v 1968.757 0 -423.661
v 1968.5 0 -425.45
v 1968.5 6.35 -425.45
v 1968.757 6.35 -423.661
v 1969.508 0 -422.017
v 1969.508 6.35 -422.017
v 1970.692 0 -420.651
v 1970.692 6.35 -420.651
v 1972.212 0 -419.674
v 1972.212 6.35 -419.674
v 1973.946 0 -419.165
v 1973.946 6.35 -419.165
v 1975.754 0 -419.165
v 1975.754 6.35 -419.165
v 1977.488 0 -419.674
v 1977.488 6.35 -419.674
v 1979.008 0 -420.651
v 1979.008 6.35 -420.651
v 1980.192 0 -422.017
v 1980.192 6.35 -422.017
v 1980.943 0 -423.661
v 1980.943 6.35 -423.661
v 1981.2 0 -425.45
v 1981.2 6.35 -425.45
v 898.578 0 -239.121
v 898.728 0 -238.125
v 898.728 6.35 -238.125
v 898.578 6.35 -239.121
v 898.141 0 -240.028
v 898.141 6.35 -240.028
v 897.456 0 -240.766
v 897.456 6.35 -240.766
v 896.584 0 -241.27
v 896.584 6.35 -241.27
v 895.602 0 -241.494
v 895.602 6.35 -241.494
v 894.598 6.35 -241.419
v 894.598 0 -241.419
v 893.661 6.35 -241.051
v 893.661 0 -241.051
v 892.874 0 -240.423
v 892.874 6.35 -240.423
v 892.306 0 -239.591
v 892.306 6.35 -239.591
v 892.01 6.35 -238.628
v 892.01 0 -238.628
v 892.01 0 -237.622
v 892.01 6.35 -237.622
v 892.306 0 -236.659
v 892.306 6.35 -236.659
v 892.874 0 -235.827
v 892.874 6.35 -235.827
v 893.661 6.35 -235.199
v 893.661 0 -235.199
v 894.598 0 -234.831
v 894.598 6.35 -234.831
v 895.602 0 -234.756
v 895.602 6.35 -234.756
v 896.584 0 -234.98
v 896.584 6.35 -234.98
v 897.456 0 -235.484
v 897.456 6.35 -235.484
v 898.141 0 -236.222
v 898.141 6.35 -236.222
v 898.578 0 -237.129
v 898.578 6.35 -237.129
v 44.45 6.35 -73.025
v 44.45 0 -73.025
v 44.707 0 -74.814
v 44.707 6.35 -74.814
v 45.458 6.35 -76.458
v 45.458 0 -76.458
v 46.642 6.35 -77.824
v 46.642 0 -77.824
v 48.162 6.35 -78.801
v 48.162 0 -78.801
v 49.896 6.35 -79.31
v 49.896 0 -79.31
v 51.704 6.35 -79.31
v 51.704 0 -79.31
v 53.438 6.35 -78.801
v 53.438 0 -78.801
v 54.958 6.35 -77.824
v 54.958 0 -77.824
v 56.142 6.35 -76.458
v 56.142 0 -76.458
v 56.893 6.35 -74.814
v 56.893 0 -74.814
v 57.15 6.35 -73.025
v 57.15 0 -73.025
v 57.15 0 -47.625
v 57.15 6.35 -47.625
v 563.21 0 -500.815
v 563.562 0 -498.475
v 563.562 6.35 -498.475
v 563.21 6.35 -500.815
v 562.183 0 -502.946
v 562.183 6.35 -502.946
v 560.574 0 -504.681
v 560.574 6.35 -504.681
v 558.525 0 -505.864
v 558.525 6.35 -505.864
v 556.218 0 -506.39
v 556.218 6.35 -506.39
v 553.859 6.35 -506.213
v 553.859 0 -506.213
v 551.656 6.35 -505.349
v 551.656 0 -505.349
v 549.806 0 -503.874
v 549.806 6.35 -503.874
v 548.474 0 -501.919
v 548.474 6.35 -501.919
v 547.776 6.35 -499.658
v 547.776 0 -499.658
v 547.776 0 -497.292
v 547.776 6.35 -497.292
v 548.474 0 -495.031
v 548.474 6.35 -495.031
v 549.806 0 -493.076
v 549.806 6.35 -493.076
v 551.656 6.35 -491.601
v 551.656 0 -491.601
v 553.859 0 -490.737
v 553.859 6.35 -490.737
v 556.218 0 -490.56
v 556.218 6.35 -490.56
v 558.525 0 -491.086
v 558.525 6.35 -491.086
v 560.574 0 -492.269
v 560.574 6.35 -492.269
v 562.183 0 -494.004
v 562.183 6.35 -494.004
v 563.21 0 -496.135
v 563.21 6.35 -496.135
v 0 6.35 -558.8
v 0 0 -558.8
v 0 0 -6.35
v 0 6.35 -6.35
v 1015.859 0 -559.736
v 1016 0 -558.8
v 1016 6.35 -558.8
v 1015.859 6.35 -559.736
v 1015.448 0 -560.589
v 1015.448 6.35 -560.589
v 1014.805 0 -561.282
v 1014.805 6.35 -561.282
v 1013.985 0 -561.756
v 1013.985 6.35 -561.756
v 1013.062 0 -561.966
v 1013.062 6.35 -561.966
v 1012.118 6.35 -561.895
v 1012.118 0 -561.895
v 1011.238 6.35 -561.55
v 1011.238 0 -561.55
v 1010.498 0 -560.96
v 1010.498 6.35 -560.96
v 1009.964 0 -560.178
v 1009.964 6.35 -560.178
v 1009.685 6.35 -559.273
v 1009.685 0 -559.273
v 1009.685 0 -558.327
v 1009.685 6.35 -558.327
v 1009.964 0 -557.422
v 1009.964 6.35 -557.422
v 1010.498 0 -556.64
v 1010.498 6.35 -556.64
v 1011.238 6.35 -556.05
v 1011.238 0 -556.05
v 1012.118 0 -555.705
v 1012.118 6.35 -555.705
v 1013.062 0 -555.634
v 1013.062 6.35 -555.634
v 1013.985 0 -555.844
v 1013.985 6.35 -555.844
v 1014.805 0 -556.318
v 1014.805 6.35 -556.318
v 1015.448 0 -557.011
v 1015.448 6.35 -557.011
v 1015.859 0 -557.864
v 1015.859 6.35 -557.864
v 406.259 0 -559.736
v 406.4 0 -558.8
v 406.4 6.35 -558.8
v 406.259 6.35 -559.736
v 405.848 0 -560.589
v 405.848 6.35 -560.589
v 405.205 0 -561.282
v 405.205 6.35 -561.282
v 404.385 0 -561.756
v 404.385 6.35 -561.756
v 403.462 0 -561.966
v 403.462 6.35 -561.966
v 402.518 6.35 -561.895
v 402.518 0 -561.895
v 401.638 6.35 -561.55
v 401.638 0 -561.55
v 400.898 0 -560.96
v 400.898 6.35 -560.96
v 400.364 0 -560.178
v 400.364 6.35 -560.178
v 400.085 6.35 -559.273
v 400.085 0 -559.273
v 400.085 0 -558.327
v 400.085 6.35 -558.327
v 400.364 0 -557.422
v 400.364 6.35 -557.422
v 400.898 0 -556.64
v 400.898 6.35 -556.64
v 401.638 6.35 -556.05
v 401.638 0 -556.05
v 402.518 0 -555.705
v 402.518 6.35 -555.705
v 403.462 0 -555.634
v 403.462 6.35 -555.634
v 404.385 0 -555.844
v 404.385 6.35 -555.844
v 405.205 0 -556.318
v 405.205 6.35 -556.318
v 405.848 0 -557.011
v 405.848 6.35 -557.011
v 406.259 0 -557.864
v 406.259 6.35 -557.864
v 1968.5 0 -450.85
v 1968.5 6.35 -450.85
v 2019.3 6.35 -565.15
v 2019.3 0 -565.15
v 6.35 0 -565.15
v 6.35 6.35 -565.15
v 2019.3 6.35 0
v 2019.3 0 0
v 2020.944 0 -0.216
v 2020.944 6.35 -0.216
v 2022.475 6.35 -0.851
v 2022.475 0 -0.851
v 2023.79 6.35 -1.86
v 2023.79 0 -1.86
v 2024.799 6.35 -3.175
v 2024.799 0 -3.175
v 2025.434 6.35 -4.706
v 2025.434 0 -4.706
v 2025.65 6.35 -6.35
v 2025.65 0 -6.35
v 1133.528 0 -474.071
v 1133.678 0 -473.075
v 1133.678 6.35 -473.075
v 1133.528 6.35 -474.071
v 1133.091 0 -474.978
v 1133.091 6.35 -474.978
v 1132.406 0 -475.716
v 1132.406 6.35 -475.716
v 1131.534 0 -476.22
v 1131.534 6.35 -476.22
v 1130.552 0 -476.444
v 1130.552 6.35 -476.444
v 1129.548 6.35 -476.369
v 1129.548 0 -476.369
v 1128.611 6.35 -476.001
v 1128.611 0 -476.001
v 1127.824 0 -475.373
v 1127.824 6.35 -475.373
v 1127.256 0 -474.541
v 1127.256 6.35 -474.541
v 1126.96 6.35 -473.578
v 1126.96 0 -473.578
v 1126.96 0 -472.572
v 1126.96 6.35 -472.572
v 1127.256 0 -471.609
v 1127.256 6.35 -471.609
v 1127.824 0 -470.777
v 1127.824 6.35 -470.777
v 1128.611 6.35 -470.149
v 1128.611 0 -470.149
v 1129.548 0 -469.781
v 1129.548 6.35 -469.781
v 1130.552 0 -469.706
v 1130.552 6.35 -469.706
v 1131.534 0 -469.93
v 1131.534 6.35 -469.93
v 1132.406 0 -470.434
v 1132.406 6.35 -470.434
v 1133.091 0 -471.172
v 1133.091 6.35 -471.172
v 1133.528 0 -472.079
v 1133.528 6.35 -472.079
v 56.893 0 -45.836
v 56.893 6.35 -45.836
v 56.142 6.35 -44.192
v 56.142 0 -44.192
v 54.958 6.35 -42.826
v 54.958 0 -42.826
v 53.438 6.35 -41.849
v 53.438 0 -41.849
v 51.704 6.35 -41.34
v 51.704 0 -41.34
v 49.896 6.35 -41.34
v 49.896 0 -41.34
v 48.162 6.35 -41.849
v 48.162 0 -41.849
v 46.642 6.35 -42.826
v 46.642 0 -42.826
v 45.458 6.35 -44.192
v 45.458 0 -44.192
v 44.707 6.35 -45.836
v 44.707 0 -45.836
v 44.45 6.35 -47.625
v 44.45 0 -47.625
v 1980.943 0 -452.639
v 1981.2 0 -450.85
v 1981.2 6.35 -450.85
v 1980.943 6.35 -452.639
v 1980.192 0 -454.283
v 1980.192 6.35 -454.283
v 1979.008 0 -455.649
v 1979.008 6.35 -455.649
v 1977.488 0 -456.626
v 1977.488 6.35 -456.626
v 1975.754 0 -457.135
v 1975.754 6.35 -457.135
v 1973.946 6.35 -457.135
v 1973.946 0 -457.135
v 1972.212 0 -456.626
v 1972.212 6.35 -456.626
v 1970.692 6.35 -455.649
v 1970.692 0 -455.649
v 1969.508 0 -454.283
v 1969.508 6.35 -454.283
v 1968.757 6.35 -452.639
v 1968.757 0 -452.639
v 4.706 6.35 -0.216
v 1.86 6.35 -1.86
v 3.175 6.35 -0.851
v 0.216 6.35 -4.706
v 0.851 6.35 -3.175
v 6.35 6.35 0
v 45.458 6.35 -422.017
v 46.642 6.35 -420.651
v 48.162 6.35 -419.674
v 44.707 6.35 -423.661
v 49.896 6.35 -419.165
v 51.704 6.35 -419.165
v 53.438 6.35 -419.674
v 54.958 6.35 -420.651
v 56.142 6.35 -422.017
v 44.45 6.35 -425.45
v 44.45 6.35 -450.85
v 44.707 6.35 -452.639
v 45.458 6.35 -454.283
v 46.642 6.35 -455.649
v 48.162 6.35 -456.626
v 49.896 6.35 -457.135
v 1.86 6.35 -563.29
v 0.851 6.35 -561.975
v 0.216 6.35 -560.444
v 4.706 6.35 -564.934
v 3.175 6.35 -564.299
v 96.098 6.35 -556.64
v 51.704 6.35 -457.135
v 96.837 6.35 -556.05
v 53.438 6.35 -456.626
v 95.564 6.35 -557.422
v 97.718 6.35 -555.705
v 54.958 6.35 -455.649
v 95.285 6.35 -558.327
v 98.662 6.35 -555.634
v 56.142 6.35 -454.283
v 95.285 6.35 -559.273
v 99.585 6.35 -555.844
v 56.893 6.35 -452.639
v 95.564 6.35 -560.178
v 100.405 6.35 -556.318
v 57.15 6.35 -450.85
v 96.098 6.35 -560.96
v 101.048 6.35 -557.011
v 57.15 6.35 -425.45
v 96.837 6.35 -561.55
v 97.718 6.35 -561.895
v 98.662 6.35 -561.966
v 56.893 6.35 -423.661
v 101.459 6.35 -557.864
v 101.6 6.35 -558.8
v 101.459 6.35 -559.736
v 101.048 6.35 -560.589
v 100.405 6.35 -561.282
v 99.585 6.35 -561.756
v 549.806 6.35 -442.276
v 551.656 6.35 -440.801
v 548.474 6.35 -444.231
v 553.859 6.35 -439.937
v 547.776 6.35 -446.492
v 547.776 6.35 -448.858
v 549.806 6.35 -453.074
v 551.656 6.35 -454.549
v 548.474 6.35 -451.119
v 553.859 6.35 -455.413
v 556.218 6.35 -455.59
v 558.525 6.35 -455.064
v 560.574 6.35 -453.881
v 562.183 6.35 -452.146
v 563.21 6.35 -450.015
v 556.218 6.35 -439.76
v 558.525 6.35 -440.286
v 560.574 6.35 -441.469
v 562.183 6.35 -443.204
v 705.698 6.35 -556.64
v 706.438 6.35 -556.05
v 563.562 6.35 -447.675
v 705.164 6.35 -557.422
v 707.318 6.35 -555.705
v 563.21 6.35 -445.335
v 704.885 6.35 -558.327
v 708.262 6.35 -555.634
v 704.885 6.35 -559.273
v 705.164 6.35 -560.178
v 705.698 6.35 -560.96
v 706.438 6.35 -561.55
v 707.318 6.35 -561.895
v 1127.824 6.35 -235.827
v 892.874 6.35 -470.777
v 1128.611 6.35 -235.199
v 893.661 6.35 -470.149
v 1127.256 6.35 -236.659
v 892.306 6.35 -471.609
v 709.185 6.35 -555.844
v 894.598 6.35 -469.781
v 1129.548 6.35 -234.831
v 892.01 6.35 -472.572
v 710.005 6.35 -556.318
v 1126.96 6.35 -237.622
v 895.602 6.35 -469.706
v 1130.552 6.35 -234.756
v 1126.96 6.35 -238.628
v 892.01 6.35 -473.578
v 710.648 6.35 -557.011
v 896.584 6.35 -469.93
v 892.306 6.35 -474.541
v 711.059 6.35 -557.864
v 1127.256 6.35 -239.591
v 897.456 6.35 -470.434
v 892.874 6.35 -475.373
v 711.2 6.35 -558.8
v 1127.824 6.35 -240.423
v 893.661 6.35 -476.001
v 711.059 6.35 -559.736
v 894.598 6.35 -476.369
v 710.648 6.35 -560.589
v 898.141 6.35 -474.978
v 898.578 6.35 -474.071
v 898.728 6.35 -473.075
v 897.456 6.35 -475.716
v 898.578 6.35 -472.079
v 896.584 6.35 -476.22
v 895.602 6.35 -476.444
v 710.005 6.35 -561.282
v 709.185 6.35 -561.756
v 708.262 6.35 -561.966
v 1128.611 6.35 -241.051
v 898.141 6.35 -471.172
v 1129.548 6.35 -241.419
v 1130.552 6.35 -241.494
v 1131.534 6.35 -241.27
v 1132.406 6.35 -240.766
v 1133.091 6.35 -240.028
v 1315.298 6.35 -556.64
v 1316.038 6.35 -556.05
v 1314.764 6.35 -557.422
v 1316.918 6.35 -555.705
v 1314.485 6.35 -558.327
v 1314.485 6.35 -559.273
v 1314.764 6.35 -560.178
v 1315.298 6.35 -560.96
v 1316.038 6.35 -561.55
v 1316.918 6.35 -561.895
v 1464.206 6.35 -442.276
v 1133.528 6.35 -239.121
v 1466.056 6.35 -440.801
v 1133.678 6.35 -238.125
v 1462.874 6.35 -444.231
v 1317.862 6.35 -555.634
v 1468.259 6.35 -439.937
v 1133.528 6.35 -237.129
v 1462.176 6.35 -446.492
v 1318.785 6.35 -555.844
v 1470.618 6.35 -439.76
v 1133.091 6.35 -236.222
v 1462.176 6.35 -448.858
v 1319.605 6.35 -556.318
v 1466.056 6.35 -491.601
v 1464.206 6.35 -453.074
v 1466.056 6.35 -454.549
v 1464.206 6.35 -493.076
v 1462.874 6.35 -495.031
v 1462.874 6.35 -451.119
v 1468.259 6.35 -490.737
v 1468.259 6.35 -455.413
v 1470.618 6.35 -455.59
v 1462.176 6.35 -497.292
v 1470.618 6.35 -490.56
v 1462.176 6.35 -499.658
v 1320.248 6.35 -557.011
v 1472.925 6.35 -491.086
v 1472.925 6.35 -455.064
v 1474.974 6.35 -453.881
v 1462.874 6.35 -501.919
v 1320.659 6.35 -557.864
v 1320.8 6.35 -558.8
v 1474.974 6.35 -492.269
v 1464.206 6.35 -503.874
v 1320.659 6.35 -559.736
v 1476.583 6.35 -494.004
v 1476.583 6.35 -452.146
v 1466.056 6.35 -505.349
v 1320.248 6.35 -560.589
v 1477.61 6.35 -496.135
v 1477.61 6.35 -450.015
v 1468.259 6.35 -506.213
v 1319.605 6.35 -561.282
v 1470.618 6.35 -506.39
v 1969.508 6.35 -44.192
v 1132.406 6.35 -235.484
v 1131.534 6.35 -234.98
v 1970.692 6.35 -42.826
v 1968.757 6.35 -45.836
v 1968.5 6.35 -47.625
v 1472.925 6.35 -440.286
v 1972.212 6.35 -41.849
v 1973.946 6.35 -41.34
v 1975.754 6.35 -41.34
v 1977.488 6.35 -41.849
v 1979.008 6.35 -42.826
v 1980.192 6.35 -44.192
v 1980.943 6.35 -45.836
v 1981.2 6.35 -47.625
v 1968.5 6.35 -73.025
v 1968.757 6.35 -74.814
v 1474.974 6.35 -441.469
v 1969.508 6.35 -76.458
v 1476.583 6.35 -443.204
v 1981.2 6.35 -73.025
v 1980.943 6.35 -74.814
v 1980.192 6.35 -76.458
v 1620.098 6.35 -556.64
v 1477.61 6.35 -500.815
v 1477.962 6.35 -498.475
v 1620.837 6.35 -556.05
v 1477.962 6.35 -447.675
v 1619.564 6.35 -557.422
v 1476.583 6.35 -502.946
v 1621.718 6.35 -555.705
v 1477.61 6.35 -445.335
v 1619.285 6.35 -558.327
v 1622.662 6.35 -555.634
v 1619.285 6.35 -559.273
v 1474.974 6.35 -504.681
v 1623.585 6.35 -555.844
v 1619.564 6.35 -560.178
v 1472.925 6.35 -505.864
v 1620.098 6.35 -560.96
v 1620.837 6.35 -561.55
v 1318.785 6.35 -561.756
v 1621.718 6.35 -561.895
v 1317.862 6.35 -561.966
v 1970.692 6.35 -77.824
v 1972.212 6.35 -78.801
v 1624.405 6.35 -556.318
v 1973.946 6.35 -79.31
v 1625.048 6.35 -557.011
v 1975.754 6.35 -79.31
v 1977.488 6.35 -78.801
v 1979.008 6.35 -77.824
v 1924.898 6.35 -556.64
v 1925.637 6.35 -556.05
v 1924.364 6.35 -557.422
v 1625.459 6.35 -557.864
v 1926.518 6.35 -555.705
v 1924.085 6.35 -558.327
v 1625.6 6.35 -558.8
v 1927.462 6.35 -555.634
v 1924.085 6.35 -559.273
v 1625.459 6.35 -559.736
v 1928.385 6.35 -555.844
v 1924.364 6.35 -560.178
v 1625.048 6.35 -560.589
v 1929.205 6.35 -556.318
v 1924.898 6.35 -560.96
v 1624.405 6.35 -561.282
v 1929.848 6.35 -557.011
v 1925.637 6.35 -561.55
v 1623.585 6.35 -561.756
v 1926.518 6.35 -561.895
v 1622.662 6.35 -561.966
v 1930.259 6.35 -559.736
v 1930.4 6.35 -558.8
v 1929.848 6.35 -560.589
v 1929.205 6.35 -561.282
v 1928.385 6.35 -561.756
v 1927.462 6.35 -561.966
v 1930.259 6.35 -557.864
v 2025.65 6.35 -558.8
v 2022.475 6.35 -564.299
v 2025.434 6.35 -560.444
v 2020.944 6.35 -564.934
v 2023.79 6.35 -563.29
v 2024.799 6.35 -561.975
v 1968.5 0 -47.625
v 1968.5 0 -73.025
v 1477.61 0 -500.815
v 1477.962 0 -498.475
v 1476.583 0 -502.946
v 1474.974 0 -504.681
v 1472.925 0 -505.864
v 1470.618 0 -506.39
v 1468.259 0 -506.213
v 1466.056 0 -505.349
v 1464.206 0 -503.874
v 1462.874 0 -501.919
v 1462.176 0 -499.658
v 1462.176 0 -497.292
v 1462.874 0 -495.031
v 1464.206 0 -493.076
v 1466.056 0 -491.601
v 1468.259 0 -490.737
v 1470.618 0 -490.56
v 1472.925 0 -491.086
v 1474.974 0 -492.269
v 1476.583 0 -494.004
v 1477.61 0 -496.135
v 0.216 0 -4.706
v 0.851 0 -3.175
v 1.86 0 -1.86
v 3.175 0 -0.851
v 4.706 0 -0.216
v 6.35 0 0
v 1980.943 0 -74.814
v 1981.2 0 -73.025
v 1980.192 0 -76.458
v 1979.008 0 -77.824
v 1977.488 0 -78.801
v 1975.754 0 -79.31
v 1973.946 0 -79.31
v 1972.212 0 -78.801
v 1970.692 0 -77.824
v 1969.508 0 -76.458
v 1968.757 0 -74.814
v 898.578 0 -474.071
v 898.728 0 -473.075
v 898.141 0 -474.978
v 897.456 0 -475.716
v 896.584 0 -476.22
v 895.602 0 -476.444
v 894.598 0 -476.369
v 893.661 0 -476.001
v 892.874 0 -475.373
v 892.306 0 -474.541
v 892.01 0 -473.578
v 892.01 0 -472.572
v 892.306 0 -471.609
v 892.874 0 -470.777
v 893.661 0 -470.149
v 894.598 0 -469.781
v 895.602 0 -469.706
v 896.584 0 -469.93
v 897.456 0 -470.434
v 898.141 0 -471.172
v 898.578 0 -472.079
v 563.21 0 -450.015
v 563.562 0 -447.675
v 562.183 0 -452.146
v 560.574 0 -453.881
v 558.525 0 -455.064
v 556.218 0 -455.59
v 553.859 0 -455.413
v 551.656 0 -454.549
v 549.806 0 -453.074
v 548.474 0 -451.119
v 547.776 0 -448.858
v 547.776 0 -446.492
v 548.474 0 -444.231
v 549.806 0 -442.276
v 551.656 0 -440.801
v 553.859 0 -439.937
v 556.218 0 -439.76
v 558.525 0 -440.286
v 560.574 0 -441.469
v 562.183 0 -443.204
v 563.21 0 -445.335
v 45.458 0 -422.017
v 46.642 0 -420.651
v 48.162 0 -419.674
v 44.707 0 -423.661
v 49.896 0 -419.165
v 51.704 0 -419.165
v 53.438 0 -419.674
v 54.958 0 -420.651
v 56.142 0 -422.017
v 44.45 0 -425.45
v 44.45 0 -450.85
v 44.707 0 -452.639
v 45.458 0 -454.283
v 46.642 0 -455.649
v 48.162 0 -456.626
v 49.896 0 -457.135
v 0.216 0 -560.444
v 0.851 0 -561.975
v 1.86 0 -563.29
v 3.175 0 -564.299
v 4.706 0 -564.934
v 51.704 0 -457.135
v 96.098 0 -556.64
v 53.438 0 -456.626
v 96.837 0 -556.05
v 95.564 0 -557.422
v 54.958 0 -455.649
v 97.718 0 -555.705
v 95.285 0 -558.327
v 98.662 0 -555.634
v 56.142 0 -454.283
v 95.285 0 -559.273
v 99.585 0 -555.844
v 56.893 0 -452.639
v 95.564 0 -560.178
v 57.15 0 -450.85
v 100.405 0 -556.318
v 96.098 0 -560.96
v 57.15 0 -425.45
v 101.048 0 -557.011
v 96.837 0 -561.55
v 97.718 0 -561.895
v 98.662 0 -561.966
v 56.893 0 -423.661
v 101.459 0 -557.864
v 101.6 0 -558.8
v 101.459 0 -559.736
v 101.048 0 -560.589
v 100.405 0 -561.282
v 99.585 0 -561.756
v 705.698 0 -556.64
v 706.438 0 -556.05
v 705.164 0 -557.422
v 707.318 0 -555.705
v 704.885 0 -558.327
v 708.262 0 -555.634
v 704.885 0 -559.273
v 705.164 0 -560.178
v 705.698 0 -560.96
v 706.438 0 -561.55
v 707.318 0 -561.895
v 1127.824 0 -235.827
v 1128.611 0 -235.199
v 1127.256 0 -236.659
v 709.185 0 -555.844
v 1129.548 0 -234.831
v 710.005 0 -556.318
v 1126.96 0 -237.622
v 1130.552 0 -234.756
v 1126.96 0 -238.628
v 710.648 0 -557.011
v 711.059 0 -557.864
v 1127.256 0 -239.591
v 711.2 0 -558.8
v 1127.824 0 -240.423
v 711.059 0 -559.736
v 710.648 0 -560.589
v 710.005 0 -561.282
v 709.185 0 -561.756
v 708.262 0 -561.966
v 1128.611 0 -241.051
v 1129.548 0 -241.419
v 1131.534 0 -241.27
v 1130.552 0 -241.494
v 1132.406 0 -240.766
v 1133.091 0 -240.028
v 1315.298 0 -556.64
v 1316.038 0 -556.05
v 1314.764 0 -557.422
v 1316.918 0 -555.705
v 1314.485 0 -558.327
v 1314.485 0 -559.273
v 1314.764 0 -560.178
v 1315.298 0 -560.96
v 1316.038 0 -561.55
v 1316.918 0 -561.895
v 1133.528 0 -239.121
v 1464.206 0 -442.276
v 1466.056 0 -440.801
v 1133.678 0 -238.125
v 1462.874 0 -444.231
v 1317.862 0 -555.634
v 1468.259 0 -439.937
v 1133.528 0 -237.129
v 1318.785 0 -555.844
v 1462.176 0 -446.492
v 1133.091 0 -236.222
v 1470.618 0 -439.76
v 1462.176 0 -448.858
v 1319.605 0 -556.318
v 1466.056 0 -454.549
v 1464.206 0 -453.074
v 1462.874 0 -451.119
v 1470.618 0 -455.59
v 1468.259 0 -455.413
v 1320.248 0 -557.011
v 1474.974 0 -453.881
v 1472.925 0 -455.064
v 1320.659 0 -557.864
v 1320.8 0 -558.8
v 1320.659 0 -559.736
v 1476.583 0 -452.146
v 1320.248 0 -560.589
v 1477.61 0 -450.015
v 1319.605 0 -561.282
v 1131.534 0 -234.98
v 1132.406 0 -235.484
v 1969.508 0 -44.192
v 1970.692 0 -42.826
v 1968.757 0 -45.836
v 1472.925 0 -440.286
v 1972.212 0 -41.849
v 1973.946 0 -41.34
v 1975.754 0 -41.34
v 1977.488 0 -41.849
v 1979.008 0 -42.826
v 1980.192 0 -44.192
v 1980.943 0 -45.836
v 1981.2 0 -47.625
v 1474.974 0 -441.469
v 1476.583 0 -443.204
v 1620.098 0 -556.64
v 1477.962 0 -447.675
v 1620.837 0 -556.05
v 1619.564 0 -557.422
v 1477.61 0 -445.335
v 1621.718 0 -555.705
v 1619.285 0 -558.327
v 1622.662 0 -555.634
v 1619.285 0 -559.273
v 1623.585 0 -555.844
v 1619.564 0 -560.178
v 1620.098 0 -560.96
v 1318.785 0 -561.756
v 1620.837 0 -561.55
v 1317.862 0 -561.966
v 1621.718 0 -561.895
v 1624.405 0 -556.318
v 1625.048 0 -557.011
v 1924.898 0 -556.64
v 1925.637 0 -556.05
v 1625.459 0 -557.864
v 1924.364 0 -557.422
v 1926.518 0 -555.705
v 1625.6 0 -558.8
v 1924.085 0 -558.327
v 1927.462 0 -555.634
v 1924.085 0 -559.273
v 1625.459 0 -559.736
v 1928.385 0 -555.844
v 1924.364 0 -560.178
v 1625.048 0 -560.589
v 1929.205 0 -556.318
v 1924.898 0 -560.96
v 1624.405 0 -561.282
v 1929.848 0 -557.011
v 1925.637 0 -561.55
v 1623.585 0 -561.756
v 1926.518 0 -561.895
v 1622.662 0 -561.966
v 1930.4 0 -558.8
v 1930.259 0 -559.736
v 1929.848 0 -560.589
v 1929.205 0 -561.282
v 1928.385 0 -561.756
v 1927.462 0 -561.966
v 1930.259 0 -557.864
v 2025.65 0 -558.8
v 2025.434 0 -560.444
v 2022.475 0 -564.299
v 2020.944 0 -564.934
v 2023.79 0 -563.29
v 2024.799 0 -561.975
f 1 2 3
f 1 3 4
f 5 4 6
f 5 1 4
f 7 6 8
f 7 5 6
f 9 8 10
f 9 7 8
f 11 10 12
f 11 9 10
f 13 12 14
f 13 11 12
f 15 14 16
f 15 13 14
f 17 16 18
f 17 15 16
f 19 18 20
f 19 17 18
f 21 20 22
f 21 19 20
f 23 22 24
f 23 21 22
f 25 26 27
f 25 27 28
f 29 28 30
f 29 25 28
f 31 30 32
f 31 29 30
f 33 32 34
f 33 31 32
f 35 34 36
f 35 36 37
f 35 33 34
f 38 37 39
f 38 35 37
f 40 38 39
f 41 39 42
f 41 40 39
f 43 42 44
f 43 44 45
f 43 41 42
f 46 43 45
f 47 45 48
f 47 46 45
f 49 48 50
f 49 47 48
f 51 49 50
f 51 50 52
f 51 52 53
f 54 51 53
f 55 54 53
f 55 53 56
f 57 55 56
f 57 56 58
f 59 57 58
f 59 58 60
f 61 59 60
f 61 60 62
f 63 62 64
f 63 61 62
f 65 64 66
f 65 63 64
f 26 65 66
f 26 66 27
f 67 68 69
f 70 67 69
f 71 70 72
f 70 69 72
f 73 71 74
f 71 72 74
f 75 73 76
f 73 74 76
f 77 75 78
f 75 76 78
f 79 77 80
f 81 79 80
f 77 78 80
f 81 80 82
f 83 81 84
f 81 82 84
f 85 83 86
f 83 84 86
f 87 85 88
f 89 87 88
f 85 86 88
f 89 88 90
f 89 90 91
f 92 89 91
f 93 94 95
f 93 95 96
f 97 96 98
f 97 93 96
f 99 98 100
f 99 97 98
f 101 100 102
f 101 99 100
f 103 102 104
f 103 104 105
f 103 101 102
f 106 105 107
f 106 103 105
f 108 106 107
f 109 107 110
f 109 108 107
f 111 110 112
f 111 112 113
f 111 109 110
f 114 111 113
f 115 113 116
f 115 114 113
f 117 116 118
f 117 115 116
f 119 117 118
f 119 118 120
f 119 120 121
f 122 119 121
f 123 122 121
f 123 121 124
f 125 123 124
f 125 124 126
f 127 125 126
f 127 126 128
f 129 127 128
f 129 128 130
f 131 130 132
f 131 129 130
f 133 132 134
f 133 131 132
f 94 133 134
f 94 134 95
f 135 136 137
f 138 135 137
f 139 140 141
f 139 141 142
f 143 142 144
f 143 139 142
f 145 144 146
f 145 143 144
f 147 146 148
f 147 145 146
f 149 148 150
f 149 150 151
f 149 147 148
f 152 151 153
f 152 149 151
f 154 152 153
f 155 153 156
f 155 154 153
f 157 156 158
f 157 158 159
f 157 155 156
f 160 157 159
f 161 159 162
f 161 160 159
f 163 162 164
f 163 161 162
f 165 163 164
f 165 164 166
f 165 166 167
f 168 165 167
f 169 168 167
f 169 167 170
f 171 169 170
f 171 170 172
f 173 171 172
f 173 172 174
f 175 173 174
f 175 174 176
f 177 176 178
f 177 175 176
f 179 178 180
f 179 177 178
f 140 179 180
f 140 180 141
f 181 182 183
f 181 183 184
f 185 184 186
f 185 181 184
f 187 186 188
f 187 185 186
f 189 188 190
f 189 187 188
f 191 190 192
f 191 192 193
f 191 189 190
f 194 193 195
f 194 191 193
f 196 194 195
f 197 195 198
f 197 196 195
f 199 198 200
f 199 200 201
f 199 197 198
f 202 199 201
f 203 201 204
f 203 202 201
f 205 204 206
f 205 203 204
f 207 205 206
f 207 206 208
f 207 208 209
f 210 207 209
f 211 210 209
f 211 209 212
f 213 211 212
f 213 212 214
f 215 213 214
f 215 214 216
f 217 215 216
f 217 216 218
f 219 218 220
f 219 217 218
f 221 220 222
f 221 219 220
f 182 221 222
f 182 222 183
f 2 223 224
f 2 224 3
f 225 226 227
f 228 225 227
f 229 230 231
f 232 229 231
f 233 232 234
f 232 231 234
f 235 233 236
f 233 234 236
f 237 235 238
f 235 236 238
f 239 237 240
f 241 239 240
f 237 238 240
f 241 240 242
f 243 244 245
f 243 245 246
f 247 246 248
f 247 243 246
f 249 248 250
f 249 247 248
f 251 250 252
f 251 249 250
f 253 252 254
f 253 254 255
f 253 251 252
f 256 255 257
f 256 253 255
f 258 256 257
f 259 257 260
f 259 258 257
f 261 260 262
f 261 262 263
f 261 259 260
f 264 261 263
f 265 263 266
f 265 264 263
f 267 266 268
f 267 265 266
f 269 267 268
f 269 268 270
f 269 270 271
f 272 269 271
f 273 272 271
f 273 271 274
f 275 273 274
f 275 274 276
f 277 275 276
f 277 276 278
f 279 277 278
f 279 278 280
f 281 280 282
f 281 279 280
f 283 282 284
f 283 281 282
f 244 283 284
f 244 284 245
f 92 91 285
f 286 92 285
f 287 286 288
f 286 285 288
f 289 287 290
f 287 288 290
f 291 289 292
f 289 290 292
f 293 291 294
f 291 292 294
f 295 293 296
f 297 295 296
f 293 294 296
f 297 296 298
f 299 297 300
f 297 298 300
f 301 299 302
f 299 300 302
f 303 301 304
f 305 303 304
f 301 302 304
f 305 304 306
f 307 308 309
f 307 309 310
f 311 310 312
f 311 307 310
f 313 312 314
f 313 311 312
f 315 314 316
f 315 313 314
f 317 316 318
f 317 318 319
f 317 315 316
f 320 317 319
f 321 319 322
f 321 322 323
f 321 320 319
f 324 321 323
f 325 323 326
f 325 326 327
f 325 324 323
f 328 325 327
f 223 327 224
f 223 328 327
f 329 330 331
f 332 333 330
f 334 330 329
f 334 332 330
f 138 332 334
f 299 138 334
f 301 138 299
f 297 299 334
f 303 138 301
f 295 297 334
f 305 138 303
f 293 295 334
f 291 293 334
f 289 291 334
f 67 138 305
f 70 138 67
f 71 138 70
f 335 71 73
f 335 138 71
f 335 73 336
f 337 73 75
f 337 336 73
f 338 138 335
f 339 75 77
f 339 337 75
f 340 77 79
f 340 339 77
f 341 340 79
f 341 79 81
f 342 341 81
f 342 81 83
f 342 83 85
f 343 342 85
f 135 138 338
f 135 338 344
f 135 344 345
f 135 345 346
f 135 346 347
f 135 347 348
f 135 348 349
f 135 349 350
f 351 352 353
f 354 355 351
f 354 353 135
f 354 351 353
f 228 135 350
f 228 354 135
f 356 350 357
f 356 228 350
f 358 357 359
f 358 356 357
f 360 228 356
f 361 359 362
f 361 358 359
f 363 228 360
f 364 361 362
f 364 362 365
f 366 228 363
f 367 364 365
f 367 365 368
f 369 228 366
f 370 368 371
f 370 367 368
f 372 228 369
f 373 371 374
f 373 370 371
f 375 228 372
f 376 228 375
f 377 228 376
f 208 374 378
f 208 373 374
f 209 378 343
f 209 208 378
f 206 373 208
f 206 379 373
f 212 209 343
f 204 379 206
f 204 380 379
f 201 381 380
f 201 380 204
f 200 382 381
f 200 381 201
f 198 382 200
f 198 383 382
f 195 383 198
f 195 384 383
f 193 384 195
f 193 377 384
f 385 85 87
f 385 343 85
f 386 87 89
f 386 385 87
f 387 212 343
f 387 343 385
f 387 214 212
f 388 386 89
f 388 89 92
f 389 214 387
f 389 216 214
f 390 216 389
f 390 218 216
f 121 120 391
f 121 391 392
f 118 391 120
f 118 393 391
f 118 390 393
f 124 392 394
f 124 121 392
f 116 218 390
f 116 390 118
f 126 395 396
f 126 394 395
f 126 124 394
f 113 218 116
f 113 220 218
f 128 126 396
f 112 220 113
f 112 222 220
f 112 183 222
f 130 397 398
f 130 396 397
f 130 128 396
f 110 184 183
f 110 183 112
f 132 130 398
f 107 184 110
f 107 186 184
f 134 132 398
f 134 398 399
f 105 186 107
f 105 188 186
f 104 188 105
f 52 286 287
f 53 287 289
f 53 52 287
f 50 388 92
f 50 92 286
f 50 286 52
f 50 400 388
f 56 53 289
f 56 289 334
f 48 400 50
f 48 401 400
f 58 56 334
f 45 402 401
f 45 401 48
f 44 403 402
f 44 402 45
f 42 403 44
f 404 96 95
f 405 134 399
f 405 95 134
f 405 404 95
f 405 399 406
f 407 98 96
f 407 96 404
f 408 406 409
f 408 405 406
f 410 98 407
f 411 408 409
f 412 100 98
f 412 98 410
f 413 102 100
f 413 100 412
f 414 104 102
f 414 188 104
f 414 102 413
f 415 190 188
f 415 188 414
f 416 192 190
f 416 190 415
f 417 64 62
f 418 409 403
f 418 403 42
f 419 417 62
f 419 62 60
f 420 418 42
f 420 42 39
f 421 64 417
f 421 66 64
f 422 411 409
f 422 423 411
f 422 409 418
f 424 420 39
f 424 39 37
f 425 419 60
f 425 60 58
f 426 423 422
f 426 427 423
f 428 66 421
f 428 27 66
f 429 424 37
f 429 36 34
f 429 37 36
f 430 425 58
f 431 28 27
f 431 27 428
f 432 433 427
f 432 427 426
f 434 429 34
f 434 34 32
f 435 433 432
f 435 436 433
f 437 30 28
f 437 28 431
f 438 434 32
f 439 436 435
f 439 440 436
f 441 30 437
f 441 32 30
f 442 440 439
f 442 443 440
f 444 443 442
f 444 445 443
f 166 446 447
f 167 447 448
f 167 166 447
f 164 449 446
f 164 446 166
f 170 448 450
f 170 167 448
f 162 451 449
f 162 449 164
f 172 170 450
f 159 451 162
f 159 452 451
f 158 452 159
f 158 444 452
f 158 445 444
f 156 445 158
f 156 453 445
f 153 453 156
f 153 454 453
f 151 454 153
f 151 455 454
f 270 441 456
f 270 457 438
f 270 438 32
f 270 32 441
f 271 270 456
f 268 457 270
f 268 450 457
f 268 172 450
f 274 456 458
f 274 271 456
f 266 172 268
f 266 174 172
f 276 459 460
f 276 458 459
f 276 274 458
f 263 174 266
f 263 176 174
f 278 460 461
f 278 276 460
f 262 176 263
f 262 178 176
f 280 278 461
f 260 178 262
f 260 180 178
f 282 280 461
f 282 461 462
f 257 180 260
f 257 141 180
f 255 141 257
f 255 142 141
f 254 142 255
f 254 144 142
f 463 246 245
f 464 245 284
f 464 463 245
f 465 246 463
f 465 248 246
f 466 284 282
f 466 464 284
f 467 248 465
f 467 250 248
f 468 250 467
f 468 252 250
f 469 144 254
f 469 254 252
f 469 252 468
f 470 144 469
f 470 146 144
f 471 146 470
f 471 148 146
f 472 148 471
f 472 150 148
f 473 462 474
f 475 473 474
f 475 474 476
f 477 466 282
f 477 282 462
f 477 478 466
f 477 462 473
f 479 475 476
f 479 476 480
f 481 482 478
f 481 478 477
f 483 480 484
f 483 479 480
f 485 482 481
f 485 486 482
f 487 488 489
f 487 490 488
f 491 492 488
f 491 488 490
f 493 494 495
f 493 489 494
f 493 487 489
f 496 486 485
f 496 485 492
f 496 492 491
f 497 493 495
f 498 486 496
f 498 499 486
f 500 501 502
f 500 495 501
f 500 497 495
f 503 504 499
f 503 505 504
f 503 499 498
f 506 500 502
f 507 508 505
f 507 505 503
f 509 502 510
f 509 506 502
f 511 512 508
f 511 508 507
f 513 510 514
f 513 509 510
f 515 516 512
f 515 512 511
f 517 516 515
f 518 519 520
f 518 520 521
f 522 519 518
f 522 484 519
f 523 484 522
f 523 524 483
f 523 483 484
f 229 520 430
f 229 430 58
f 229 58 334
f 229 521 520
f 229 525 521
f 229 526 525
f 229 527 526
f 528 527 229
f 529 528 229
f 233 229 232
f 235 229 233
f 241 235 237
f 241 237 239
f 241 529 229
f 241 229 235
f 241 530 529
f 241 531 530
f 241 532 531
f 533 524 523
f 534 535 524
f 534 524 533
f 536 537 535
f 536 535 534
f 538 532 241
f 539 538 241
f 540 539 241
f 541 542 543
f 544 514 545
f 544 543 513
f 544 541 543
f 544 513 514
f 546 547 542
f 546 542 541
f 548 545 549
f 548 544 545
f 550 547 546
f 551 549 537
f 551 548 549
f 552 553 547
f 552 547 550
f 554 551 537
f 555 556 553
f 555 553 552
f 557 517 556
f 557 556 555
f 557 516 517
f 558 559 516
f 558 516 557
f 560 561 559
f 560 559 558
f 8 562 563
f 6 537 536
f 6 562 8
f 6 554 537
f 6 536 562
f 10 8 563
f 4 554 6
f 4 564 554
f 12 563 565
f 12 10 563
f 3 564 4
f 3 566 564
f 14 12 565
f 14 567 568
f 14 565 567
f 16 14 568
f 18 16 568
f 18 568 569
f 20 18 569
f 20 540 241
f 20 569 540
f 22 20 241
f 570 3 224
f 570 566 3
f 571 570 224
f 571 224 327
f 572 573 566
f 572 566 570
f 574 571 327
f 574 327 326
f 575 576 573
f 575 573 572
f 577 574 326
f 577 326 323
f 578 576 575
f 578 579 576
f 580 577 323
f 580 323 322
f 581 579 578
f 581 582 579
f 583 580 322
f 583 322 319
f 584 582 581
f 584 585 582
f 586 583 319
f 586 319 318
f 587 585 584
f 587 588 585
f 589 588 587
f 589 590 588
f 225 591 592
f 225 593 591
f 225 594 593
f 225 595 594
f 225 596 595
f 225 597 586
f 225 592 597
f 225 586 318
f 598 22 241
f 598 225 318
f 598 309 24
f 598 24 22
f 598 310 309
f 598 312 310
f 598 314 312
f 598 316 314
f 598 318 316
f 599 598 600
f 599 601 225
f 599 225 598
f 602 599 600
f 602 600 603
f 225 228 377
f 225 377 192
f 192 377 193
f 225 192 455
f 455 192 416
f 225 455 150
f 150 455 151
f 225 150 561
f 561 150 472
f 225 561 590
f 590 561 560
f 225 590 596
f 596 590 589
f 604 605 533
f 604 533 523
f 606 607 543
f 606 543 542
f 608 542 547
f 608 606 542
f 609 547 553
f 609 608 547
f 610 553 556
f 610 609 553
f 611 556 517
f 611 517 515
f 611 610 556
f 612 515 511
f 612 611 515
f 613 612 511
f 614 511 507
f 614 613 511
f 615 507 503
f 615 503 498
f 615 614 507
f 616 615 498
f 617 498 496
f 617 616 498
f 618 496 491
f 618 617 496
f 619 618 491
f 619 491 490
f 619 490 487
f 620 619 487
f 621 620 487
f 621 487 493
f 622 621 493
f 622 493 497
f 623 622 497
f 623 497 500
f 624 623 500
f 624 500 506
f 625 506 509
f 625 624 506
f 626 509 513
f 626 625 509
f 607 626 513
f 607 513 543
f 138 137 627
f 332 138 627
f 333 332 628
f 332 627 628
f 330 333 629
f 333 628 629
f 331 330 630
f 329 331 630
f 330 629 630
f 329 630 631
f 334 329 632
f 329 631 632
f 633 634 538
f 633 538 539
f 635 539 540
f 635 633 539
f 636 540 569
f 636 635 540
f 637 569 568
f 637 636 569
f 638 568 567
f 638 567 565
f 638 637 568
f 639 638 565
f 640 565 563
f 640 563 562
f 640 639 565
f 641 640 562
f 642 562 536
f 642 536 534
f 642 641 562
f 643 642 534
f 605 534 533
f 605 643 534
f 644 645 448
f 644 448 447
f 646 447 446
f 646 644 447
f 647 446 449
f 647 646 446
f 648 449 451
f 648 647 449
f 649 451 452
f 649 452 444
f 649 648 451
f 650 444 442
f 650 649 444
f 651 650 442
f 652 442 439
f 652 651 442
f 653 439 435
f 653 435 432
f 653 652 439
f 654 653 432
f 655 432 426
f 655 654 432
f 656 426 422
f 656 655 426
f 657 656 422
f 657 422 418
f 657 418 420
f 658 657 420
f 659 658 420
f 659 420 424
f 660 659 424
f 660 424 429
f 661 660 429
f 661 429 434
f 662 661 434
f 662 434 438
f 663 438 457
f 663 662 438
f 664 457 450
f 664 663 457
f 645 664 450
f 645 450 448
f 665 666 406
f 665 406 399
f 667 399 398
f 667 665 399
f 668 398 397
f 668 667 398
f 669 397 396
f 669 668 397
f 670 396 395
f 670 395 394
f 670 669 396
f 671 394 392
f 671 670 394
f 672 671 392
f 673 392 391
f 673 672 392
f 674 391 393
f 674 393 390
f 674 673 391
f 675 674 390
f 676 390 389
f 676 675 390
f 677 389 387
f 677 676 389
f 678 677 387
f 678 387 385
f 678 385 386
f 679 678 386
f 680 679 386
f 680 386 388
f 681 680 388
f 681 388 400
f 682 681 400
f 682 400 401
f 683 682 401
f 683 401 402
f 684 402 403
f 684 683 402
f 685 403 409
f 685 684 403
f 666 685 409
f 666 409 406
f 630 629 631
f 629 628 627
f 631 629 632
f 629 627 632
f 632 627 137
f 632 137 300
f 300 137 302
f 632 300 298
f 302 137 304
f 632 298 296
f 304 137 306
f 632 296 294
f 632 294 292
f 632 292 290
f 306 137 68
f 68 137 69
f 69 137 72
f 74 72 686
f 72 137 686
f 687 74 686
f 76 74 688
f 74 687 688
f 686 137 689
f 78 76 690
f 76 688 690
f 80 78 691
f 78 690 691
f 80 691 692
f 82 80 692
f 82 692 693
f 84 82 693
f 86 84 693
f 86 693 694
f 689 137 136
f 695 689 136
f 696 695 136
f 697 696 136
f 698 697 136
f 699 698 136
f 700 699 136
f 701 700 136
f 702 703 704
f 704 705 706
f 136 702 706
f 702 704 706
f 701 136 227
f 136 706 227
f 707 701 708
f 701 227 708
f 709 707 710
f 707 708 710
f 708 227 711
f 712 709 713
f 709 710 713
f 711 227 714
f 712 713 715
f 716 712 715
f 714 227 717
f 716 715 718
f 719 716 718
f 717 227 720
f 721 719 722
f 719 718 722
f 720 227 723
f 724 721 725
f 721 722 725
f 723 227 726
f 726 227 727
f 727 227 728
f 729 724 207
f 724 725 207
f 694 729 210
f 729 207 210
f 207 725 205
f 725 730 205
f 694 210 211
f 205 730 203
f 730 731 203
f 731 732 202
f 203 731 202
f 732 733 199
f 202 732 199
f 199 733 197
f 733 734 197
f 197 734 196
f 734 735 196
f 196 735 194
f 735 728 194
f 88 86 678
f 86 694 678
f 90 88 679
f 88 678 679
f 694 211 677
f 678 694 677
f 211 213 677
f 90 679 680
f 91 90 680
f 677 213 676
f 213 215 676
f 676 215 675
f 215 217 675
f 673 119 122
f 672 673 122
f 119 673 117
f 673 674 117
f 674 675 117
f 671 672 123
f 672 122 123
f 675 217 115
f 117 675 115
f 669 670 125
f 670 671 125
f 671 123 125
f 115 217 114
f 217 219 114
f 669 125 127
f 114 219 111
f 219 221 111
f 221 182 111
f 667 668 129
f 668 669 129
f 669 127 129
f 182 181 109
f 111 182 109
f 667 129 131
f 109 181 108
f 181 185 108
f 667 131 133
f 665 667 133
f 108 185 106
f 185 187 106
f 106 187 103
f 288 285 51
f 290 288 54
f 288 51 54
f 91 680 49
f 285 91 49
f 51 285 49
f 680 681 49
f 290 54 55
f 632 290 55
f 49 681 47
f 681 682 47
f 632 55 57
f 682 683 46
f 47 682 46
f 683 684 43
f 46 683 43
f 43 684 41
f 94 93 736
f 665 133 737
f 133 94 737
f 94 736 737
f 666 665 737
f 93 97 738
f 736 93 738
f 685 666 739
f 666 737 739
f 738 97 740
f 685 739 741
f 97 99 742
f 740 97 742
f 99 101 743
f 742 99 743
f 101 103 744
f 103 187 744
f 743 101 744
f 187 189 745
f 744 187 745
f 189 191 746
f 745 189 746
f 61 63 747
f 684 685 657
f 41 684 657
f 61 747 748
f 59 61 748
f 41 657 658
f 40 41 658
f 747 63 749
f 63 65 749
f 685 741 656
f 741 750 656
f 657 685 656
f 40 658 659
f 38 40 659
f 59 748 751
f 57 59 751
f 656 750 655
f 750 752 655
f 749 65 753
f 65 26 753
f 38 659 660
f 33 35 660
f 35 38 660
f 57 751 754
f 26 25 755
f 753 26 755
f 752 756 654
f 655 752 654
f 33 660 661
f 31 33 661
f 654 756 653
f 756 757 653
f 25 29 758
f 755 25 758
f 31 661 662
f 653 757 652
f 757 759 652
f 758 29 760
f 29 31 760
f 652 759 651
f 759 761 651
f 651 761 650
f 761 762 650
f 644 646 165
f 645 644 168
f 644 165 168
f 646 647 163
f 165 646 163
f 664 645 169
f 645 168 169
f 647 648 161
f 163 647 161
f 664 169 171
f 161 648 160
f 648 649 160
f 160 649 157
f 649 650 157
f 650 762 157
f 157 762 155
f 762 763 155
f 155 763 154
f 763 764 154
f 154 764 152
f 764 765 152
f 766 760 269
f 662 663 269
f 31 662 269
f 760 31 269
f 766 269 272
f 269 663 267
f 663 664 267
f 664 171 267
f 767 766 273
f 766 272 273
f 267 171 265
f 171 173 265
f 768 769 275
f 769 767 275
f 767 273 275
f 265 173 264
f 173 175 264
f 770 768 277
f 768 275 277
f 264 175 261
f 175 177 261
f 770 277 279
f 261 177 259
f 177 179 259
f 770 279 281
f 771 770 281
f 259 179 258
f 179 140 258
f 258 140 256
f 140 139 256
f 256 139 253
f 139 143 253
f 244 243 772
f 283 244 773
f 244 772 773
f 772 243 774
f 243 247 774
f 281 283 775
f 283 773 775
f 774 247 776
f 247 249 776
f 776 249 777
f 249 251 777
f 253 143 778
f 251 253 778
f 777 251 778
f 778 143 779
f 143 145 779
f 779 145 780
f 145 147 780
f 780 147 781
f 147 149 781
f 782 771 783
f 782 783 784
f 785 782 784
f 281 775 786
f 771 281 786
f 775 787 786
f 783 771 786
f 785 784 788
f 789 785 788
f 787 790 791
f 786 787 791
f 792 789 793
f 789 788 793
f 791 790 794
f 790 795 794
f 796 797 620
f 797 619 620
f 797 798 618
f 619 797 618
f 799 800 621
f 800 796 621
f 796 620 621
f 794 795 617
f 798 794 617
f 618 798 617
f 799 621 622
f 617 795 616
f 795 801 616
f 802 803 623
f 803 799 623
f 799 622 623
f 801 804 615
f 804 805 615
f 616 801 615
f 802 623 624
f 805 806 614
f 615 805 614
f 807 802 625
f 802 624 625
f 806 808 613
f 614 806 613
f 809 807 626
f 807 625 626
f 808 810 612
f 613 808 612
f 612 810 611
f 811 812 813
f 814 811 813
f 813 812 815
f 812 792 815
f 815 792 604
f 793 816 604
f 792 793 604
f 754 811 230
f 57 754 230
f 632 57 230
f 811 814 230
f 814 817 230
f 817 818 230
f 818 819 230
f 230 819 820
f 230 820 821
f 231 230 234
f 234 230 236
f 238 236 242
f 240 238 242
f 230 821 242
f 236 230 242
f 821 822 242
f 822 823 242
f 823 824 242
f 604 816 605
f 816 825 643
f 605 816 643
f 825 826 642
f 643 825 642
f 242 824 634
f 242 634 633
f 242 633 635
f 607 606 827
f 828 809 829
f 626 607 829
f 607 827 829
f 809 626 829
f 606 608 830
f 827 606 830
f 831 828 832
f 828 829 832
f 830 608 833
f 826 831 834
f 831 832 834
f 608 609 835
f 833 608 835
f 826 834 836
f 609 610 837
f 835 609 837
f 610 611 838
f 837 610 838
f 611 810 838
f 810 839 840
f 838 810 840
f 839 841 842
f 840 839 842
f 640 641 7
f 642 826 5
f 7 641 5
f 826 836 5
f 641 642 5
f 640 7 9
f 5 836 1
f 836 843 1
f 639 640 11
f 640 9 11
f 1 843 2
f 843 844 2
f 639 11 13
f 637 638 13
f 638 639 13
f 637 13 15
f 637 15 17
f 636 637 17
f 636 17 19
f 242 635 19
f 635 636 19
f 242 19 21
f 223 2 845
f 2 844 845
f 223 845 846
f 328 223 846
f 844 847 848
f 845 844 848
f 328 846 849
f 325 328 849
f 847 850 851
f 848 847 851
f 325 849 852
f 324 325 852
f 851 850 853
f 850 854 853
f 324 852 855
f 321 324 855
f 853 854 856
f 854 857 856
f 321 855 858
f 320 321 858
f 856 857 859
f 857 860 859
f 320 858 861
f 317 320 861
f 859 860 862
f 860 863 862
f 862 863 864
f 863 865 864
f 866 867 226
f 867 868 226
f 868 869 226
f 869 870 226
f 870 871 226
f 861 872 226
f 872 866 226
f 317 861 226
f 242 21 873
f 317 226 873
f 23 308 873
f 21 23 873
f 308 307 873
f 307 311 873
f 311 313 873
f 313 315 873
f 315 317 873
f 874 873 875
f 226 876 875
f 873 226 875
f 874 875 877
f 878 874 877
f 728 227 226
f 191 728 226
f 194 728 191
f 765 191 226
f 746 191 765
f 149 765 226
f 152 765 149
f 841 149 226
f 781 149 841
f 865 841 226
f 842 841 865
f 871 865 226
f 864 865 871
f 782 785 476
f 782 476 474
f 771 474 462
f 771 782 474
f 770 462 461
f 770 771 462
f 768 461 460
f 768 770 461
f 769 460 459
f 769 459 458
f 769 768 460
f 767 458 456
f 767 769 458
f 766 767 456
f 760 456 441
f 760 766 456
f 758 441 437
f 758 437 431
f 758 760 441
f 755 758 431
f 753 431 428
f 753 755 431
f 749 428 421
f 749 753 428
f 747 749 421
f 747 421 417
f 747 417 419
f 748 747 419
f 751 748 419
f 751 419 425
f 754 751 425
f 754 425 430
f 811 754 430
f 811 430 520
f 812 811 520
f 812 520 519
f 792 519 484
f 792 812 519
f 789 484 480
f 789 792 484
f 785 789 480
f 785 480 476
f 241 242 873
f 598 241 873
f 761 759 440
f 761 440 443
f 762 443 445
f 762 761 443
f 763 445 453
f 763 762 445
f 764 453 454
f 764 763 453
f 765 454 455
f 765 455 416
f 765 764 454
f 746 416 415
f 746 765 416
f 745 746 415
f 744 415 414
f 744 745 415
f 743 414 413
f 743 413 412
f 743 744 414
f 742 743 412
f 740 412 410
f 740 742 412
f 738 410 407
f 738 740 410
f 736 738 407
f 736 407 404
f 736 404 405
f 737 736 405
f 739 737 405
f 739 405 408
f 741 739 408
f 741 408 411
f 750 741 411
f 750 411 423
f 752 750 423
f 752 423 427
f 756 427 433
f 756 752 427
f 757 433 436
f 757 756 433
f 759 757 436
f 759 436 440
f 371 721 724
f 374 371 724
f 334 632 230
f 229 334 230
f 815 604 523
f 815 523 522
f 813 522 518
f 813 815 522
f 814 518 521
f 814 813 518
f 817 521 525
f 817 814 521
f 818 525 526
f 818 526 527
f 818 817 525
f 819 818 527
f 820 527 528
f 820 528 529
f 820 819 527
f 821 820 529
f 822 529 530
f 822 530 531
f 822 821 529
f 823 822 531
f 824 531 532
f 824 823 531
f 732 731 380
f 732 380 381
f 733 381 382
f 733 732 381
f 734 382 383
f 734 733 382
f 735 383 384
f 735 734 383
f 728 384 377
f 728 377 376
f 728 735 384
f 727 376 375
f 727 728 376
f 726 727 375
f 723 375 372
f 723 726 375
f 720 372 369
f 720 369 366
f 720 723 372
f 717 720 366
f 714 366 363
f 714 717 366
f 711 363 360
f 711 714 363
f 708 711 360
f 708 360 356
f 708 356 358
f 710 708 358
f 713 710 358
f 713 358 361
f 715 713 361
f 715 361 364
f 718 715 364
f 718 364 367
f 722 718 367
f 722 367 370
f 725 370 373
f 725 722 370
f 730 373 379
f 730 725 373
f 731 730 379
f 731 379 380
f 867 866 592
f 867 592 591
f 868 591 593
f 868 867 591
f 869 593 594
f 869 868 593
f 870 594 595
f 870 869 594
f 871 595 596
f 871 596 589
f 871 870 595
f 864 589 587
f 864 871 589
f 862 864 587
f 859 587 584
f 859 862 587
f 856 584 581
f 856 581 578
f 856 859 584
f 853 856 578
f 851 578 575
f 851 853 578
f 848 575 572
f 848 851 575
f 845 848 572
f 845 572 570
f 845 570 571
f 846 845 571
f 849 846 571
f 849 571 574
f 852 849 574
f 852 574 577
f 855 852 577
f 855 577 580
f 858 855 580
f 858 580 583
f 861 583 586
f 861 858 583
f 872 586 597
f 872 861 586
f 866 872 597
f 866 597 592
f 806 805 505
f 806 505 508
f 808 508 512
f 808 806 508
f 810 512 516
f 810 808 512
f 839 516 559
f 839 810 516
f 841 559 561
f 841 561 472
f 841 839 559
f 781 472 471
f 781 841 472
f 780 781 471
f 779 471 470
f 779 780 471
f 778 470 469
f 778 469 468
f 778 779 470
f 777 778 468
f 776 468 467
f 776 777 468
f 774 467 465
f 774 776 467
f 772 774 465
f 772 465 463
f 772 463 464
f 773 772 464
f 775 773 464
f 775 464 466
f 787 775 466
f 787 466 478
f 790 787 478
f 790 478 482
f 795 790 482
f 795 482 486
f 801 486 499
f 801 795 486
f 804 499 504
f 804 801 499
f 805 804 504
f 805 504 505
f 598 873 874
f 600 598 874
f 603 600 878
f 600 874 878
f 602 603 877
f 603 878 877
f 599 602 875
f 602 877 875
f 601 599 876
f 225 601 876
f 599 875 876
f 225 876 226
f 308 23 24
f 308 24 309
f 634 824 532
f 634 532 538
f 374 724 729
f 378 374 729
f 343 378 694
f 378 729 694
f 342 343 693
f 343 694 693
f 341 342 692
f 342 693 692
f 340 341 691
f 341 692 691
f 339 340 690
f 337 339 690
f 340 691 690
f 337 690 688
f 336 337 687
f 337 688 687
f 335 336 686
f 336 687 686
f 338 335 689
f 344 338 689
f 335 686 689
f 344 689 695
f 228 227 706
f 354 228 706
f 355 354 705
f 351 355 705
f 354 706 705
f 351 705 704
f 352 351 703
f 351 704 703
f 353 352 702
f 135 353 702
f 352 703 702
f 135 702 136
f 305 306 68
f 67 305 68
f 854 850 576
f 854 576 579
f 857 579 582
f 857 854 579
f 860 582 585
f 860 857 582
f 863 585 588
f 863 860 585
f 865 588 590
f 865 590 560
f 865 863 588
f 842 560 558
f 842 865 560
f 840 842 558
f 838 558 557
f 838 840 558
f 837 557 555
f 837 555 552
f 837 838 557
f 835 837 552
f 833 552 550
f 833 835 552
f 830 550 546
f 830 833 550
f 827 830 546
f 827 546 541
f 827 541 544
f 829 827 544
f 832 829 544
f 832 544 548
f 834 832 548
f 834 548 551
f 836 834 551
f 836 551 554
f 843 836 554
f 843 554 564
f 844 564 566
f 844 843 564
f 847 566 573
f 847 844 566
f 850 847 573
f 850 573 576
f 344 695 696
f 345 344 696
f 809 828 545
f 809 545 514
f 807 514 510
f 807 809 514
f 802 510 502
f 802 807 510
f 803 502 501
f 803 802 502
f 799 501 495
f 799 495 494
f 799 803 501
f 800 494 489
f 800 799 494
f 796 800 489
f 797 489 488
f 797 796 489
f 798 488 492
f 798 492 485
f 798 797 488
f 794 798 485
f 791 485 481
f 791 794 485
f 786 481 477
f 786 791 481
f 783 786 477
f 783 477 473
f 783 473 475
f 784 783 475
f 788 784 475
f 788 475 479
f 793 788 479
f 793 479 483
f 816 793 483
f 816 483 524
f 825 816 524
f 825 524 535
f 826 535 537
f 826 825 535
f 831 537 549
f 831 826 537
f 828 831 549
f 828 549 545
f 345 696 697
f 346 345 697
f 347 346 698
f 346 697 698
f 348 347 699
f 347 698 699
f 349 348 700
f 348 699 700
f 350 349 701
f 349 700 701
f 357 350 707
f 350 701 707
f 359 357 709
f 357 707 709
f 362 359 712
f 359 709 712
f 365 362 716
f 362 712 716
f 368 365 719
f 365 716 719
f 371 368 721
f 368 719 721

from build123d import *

# Parameters (mm, degrees)
SKETCH1_R           = 7.9375
SKETCH1_R_2         = 3.3782
SKETCH1_R_3         = 3.175
BOSS_EXTRUDE1_DEPTH = 6.35


with BuildPart() as part:
    # Sketch1 → Boss-Extrude1 (new body)
    with BuildSketch(Plane(origin=(0, 0, 0), x_dir=(1, 0, 0), z_dir=(0, 1, 0))):
        with BuildLine():
            Line((6.35, 0), (2019.3, 0))
            ThreePointArc((2019.3, 0), (2023.790128061, 1.859871939), (2025.65, 6.35))
            Line((2025.65, 6.35), (2025.65, 558.8))
            ThreePointArc((2025.65, 558.8), (2023.790128061, 563.290128061), (2019.3, 565.15))
            Line((2019.3, 565.15), (6.35, 565.15))
            ThreePointArc((6.35, 565.15), (1.859871939, 563.290128061), (0, 558.8))
            Line((0, 558.8), (0, 6.35))
            ThreePointArc((0, 6.35), (1.859871939, 1.859871939), (6.35, 0))
        make_face()
        with Locations((555.625, 447.675)):
            Circle(SKETCH1_R, mode=Mode.SUBTRACT)
        with Locations((1470.025, 447.675)):
            Circle(SKETCH1_R, mode=Mode.SUBTRACT)
        with Locations((895.35, 473.075)):
            Circle(SKETCH1_R_2, mode=Mode.SUBTRACT)
        with Locations((1130.3, 473.075)):
            Circle(SKETCH1_R_2, mode=Mode.SUBTRACT)
        with Locations((1130.3, 238.125)):
            Circle(SKETCH1_R_2, mode=Mode.SUBTRACT)
        with Locations((895.35, 238.125)):
            Circle(SKETCH1_R_2, mode=Mode.SUBTRACT)
        with Locations((555.625, 498.475)):
            Circle(SKETCH1_R, mode=Mode.SUBTRACT)
        with Locations((1470.025, 498.475)):
            Circle(SKETCH1_R, mode=Mode.SUBTRACT)
        with Locations((1927.225, 558.8)):
            Circle(SKETCH1_R_3, mode=Mode.SUBTRACT)
        with Locations((1622.425, 558.8)):
            Circle(SKETCH1_R_3, mode=Mode.SUBTRACT)
        with Locations((1317.625, 558.8)):
            Circle(SKETCH1_R_3, mode=Mode.SUBTRACT)
        with Locations((1012.825, 558.8)):
            Circle(SKETCH1_R_3, mode=Mode.SUBTRACT)
        with Locations((708.025, 558.8)):
            Circle(SKETCH1_R_3, mode=Mode.SUBTRACT)
        with Locations((403.225, 558.8)):
            Circle(SKETCH1_R_3, mode=Mode.SUBTRACT)
        with Locations((98.425, 558.8)):
            Circle(SKETCH1_R_3, mode=Mode.SUBTRACT)
        with BuildLine():
            Line((57.15, 73.025), (57.15, 47.625))
            ThreePointArc((57.15, 47.625), (50.8, 41.275), (44.45, 47.625))
            Line((44.45, 47.625), (44.45, 73.025))
            ThreePointArc((44.45, 73.025), (50.8, 79.375), (57.15, 73.025))
        make_face(mode=Mode.SUBTRACT)
        with BuildLine():
            Line((1968.5, 73.025), (1968.5, 47.625))
            ThreePointArc((1968.5, 47.625), (1974.85, 41.275), (1981.2, 47.625))
            Line((1981.2, 47.625), (1981.2, 73.025))
            ThreePointArc((1981.2, 73.025), (1974.85, 79.375), (1968.5, 73.025))
        make_face(mode=Mode.SUBTRACT)
        with BuildLine():
            Line((44.45, 425.45), (44.45, 450.85))
            ThreePointArc((44.45, 450.85), (50.8, 457.2), (57.15, 450.85))
            Line((57.15, 450.85), (57.15, 425.45))
            ThreePointArc((57.15, 425.45), (50.8, 419.1), (44.45, 425.45))
        make_face(mode=Mode.SUBTRACT)
        with BuildLine():
            Line((1981.2, 425.45), (1981.2, 450.85))
            ThreePointArc((1981.2, 450.85), (1974.85, 457.2), (1968.5, 450.85))
            Line((1968.5, 450.85), (1968.5, 425.45))
            ThreePointArc((1968.5, 425.45), (1974.85, 419.1), (1981.2, 425.45))
        make_face(mode=Mode.SUBTRACT)
    extrude(amount=BOSS_EXTRUDE1_DEPTH)


solid = part.part
